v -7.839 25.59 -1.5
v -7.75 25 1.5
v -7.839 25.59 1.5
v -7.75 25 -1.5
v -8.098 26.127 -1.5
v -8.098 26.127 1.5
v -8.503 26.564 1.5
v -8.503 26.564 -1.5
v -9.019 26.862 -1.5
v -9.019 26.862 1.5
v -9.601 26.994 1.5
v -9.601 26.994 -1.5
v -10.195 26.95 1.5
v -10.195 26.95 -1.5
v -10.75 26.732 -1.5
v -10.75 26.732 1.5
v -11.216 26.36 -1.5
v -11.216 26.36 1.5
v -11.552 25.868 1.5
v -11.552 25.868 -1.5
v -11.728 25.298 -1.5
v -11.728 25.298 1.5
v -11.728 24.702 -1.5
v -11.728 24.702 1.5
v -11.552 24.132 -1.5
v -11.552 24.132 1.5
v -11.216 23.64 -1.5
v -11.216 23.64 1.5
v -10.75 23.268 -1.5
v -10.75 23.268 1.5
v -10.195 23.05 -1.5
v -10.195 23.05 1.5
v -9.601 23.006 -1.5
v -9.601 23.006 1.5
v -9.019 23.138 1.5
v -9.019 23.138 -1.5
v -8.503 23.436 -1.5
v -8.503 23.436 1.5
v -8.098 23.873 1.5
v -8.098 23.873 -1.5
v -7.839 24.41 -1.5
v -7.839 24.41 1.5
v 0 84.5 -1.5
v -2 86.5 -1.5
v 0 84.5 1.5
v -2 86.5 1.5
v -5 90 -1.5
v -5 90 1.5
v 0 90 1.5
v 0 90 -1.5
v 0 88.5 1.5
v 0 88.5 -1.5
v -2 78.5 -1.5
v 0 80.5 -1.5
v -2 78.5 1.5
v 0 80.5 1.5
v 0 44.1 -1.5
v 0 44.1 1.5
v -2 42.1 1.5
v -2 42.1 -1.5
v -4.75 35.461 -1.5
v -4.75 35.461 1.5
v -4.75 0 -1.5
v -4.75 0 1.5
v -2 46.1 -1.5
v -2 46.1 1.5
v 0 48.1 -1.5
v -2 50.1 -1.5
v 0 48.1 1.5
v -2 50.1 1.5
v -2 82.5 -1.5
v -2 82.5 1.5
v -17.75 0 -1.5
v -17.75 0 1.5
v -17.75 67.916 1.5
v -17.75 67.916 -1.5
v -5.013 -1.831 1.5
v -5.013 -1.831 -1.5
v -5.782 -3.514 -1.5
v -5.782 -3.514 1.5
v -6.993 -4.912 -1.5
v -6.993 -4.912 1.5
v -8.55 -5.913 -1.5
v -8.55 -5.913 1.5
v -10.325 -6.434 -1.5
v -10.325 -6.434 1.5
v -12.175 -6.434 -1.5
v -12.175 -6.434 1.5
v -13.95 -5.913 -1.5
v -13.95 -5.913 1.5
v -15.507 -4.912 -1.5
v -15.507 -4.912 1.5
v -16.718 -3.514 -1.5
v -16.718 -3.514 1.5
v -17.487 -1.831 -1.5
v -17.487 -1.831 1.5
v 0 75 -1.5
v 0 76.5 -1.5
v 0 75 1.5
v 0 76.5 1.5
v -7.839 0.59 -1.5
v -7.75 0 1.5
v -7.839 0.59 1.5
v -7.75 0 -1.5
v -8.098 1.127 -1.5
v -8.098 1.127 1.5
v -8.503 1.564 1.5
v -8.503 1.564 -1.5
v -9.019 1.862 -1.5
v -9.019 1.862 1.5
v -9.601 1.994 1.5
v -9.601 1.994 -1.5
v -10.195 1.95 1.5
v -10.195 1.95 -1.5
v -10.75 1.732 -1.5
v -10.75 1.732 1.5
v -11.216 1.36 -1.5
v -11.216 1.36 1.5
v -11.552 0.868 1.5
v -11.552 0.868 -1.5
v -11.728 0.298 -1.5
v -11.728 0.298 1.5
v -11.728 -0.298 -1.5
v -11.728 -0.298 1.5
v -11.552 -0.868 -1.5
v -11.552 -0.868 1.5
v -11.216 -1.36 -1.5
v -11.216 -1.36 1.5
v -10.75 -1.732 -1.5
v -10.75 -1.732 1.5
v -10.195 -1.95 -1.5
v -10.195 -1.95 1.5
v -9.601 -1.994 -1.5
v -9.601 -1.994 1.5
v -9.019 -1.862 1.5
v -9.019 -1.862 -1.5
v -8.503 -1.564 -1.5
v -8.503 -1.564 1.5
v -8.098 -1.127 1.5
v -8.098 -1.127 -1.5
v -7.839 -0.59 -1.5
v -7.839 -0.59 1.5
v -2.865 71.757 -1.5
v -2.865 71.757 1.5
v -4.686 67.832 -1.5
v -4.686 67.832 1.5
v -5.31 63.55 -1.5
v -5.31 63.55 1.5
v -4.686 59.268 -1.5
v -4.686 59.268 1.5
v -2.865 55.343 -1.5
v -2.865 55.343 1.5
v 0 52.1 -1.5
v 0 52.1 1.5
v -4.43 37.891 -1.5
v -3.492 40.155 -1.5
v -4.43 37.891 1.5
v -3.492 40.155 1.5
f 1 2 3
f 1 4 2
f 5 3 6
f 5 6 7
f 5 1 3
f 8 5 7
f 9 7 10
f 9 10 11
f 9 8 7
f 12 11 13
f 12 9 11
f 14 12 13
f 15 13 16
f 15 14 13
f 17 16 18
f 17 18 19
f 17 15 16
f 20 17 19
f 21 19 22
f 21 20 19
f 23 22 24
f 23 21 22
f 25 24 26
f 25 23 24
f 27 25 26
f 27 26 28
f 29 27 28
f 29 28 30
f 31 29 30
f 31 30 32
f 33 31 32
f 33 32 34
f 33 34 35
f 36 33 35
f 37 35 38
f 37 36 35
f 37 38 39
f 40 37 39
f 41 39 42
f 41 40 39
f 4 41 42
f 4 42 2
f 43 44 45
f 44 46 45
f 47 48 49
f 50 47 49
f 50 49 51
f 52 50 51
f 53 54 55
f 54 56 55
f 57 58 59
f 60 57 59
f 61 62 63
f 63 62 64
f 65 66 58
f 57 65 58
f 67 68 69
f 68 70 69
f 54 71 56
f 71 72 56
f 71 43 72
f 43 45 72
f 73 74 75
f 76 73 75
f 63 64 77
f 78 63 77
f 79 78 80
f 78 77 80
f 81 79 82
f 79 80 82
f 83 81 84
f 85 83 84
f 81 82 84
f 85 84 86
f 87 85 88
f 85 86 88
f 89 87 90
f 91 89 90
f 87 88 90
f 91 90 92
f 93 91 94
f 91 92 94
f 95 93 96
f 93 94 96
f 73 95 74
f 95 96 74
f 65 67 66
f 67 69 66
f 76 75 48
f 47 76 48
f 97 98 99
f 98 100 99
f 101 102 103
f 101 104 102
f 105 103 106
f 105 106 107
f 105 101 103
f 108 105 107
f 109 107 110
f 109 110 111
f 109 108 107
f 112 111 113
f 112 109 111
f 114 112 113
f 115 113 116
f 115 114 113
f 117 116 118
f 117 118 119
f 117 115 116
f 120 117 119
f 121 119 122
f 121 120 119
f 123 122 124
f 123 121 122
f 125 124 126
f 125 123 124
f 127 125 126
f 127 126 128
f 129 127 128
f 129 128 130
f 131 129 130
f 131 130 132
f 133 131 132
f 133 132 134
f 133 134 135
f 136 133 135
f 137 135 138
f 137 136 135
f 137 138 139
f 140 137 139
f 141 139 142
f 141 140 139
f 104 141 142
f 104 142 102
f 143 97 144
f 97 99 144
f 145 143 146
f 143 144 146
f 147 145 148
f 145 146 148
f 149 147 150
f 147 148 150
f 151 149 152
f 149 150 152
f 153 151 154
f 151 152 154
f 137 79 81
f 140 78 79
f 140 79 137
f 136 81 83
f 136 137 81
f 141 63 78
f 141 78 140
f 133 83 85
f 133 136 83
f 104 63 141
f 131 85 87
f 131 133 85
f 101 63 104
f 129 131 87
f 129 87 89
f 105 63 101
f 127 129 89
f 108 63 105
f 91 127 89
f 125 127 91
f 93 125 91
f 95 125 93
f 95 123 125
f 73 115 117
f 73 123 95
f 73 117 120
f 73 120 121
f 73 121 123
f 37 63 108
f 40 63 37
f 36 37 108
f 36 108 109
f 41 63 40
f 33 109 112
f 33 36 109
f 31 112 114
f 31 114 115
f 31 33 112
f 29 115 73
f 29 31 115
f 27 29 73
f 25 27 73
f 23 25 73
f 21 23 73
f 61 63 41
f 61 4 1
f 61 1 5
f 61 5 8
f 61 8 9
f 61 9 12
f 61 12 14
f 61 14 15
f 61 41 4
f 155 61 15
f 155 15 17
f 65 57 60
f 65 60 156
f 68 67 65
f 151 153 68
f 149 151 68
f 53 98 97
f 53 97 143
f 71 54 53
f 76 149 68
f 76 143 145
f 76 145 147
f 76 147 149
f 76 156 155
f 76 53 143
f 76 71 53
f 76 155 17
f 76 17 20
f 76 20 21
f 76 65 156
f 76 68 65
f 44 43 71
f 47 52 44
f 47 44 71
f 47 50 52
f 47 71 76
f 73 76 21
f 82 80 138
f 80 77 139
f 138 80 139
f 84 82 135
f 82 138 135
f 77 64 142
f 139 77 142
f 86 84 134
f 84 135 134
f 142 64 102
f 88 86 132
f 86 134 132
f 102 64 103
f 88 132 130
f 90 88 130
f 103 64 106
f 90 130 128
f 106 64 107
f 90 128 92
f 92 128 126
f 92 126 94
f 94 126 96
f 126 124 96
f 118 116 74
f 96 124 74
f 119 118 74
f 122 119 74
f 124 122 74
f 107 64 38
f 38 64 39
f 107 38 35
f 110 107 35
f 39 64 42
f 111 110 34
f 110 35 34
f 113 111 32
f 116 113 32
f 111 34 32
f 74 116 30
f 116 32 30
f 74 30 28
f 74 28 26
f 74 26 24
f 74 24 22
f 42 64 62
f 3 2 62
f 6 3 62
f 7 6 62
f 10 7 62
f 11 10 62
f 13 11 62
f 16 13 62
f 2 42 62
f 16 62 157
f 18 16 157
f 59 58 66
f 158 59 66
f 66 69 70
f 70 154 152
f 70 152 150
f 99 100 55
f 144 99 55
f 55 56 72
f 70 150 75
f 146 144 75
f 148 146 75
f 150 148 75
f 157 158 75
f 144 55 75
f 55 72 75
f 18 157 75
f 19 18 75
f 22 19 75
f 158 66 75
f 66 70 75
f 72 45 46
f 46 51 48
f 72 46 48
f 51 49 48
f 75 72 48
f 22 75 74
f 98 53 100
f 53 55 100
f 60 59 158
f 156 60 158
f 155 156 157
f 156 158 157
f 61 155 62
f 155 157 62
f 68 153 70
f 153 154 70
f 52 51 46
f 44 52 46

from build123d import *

# Parameters (mm, degrees)
SKETCH1_R           = 2
BOSS_EXTRUDE1_DEPTH = 1.5


with BuildPart() as part:
    # Sketch1 → Boss-Extrude1 (new body, symmetric)
    with BuildSketch(Plane.XY):
        with BuildLine():
            Line((0, 88.5), (-2, 86.5))
            Line((-2, 86.5), (0, 84.5))
            Line((0, 84.5), (-2, 82.5))
            Line((-2, 82.5), (0, 80.5))
            Line((0, 80.5), (-2, 78.5))
            Line((-2, 78.5), (0, 76.5))
            Line((0, 76.5), (0, 75))
            ThreePointArc((0, 75), (-5.309927761, 63.55), (0, 52.1))
            Line((0, 52.1), (-2, 50.1))
            Line((-2, 50.1), (0, 48.1))
            Line((0, 48.1), (-2, 46.1))
            Line((-2, 46.1), (0, 44.1))
            Line((0, 44.1), (-2, 42.1))
            ThreePointArc((-2, 42.1), (-4.035298286, 39.053960857), (-4.75, 35.460912703))
            Line((-4.75, 35.460912703), (-4.75, 0))
            ThreePointArc((-4.75, 0), (-11.25, -6.5), (-17.75, 0))
            Line((-17.75, 0), (-17.75, 67.916352203))
            Line((-17.75, 67.916352203), (-5, 90))
            Line((-5, 90), (0, 90))
            Line((0, 90), (0, 88.5))
        make_face()
        with Locations((-9.75, 0)):
            Circle(SKETCH1_R, mode=Mode.SUBTRACT)
        with Locations((-9.75, 25)):
            Circle(SKETCH1_R, mode=Mode.SUBTRACT)
    extrude(amount=BOSS_EXTRUDE1_DEPTH, both=True)


solid = part.part
